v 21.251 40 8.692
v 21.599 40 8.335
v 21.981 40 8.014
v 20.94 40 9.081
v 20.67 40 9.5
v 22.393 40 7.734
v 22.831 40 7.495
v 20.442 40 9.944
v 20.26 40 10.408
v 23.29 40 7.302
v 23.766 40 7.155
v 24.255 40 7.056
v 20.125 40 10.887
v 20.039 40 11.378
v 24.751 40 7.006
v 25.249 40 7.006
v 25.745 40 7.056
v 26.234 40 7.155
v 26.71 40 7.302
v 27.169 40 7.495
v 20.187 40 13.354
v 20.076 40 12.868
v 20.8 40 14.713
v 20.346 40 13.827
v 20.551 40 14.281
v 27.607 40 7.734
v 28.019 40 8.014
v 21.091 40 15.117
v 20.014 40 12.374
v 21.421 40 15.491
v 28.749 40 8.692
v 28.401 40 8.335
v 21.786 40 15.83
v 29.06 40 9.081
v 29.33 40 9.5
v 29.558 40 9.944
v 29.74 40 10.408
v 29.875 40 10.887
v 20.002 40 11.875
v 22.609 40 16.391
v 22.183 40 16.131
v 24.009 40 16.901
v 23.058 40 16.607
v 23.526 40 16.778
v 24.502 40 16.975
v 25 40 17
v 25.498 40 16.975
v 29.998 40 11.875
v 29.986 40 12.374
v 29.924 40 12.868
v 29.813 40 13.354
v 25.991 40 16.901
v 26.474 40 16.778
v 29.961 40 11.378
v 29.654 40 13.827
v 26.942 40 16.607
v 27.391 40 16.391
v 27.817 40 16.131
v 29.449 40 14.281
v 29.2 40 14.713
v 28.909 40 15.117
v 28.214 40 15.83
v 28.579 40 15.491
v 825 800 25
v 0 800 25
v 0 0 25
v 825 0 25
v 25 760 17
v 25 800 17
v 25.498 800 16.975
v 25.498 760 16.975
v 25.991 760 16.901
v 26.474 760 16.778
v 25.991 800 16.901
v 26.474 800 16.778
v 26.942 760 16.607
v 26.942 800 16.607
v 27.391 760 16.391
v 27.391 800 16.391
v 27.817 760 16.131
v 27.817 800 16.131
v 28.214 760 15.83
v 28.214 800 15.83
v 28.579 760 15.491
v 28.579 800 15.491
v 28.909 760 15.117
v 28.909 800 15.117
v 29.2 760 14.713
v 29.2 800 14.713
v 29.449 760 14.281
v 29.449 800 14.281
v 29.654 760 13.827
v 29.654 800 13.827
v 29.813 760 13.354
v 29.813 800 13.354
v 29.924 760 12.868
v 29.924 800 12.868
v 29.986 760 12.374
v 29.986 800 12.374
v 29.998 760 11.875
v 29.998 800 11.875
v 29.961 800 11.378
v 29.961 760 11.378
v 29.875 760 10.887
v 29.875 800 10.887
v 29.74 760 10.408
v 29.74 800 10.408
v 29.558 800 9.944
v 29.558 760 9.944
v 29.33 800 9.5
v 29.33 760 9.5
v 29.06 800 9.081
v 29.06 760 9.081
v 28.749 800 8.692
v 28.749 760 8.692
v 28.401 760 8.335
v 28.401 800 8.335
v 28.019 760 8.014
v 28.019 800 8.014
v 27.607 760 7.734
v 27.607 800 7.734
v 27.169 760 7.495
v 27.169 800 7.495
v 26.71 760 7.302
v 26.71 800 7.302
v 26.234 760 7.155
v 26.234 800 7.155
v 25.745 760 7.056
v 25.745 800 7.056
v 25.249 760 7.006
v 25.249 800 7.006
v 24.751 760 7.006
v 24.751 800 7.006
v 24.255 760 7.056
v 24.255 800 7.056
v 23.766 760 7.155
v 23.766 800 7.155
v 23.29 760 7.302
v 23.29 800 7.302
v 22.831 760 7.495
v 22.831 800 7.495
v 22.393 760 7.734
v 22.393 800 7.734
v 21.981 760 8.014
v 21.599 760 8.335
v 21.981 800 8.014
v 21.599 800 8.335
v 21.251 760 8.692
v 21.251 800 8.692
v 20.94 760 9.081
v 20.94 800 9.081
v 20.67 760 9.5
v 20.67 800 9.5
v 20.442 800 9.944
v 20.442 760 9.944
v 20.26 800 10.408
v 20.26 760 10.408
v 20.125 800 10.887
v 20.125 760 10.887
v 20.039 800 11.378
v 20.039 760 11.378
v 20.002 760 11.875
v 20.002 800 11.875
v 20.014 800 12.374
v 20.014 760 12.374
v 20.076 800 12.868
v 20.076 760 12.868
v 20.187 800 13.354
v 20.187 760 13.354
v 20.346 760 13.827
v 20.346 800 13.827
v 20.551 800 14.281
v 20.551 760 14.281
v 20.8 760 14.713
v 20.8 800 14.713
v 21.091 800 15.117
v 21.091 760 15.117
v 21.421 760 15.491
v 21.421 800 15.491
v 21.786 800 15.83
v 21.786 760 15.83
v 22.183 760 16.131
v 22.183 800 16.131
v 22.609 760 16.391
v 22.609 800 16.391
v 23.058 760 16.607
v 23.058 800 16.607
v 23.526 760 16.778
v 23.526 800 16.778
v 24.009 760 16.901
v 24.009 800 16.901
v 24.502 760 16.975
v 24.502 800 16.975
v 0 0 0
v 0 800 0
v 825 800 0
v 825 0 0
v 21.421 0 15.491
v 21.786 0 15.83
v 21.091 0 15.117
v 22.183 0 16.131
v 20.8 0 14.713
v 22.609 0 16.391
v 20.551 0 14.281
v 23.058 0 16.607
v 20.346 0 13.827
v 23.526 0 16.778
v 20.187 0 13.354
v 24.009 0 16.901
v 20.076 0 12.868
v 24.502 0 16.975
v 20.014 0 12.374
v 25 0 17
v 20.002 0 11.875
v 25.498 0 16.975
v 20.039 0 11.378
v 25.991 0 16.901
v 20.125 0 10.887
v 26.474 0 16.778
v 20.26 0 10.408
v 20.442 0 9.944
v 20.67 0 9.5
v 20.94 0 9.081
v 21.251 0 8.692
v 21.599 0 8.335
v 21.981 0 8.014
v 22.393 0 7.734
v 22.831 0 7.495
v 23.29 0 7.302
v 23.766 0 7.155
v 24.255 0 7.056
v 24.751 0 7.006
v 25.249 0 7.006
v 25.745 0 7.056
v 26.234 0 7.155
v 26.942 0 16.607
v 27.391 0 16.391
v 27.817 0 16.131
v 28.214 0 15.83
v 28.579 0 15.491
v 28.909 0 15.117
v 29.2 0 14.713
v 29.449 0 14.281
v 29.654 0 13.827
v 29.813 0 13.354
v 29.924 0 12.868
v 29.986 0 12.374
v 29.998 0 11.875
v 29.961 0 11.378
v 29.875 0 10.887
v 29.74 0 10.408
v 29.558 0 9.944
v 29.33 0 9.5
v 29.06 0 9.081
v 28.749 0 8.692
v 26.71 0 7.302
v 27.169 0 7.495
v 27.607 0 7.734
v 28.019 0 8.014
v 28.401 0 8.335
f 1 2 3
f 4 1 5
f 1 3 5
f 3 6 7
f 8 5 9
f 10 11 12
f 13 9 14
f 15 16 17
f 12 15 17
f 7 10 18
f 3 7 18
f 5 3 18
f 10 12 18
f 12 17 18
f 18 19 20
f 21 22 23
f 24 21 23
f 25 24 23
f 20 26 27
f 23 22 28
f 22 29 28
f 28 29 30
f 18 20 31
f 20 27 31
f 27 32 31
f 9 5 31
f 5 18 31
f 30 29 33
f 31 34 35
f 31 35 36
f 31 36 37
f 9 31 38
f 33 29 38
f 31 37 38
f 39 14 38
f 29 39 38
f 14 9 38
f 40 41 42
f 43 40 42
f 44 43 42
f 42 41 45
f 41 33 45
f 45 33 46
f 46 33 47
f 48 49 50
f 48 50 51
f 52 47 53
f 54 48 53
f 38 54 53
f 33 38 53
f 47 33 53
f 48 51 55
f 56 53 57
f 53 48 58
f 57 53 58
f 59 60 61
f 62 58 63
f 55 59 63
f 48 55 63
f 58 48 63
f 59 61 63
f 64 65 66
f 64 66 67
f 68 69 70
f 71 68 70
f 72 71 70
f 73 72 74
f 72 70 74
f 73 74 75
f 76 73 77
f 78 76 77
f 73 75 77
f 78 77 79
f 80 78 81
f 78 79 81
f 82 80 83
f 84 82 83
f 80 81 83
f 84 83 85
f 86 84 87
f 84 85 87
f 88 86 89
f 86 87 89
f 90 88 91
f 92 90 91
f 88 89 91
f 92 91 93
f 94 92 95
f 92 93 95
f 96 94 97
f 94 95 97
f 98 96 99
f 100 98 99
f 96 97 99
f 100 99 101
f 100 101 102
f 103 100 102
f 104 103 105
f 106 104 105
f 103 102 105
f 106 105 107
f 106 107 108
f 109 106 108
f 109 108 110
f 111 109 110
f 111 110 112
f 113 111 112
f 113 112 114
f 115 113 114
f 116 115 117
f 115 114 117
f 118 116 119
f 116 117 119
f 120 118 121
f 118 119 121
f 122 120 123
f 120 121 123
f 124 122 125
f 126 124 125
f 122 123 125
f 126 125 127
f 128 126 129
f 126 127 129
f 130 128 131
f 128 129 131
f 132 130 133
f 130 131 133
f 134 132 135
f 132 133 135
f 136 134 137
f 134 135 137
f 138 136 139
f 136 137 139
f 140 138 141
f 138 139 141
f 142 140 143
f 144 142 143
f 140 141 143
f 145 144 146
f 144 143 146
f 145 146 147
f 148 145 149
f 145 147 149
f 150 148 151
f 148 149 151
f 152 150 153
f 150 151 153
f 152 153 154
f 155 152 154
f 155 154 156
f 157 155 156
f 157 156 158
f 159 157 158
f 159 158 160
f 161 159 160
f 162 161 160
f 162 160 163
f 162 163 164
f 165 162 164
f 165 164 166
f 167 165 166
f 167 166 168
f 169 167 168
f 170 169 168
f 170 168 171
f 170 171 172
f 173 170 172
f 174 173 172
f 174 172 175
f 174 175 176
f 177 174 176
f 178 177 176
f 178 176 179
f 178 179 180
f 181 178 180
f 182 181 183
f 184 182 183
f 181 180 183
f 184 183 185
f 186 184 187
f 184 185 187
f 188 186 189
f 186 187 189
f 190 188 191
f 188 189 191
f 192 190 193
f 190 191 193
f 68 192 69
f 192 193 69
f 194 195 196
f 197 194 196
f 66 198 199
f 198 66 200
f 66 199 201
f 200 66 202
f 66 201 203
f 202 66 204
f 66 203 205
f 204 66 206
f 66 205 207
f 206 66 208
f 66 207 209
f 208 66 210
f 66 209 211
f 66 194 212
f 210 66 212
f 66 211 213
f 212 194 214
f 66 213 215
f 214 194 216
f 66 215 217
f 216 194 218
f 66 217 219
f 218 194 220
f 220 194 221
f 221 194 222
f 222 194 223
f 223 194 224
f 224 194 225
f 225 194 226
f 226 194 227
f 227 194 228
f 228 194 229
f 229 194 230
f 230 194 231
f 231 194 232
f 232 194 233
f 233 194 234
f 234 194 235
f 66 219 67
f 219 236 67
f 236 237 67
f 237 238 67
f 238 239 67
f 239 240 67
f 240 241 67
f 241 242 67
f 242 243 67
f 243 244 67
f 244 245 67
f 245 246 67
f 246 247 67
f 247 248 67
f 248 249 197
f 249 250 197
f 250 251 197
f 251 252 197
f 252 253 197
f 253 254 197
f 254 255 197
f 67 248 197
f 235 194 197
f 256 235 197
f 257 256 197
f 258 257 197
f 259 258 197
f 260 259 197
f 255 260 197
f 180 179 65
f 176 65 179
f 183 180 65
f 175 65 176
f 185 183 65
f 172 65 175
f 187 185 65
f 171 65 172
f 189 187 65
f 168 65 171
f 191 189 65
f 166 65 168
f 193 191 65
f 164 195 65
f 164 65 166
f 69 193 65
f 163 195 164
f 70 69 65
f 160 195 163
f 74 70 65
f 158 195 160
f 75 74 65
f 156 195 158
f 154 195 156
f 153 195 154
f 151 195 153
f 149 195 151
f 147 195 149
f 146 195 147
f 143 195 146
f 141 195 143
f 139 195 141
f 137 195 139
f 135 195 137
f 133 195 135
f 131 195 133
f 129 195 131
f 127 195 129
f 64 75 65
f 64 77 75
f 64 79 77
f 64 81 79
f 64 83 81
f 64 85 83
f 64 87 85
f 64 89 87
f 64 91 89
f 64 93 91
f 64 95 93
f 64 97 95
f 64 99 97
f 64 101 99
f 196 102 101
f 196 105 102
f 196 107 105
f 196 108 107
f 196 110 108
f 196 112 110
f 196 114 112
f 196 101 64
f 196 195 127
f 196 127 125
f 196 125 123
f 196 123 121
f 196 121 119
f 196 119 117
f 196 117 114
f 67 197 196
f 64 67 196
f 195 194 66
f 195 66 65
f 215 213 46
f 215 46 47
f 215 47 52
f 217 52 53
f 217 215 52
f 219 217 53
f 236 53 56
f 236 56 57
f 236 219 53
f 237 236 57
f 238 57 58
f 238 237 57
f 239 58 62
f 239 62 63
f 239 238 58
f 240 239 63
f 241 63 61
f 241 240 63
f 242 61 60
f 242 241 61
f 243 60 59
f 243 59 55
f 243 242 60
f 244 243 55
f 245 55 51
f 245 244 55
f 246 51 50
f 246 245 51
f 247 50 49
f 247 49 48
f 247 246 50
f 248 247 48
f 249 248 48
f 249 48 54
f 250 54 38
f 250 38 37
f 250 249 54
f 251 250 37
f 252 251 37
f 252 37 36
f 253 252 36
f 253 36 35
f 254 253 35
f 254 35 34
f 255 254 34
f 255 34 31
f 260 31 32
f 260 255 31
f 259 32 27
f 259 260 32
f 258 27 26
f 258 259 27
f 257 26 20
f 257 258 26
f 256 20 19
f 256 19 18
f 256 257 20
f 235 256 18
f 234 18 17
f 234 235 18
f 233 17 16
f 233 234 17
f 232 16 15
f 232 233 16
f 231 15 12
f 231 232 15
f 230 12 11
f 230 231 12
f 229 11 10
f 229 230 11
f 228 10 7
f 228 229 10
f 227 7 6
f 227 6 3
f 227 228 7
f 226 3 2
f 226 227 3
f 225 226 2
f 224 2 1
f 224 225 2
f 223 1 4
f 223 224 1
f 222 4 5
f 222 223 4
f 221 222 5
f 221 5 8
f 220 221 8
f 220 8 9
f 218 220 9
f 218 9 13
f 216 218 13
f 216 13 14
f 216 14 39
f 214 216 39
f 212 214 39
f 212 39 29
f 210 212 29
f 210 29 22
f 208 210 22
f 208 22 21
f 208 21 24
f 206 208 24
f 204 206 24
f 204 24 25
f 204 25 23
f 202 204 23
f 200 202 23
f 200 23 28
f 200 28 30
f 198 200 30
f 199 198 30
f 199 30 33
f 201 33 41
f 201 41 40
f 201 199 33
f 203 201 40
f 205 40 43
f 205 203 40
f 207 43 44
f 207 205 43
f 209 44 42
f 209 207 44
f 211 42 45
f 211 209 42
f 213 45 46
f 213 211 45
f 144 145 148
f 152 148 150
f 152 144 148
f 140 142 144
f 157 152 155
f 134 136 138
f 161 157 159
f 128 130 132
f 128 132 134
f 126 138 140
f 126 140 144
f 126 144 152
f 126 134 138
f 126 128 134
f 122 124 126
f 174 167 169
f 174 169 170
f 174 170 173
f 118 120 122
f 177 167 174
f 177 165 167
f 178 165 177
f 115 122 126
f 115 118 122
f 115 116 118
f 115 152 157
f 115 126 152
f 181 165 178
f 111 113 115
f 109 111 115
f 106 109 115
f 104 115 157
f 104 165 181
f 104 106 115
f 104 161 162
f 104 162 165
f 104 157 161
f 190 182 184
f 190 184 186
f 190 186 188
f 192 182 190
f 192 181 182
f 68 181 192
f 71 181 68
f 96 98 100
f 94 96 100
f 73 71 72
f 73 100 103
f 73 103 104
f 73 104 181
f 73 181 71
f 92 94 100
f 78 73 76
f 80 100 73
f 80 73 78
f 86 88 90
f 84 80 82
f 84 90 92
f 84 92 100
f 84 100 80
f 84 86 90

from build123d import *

# Parameters (mm, degrees)
SZKIC1_W                    = 825
SZKIC1_H                    = 800
DODANIE_WYCI_GNI_CIE1_DEPTH = 25
SZKIC3_R                    = 5
WYTNIJ_WYCI_GNI_CIE1_DEPTH  = 40


with BuildPart() as part:
    # Szkic1 → Dodanie-wyciągnięcie1 (new body)
    with BuildSketch(Plane.XY):
        with Locations((412.5, 400)):
            Rectangle(SZKIC1_W, SZKIC1_H)
    extrude(amount=DODANIE_WYCI_GNI_CIE1_DEPTH)

    # Szkic3 → Wytnij-wyciągnięcie1 (cut)
    with BuildSketch(Plane(origin=(0, 0, 0), x_dir=(1, 0, 0), z_dir=(0, 1, 0))):
        with Locations(Location((25, -12, 0), (0, 0, 270))):
            Circle(SZKIC3_R)
    wytnij_wyci_gni_cie1 = extrude(amount=WYTNIJ_WYCI_GNI_CIE1_DEPTH, mode=Mode.SUBTRACT)

    # Lustro1: Wytnij-wyciągnięcie1 across plane
    add(wytnij_wyci_gni_cie1.mirror(Plane.ZX.offset(400)), mode=Mode.SUBTRACT)


solid = part.part
